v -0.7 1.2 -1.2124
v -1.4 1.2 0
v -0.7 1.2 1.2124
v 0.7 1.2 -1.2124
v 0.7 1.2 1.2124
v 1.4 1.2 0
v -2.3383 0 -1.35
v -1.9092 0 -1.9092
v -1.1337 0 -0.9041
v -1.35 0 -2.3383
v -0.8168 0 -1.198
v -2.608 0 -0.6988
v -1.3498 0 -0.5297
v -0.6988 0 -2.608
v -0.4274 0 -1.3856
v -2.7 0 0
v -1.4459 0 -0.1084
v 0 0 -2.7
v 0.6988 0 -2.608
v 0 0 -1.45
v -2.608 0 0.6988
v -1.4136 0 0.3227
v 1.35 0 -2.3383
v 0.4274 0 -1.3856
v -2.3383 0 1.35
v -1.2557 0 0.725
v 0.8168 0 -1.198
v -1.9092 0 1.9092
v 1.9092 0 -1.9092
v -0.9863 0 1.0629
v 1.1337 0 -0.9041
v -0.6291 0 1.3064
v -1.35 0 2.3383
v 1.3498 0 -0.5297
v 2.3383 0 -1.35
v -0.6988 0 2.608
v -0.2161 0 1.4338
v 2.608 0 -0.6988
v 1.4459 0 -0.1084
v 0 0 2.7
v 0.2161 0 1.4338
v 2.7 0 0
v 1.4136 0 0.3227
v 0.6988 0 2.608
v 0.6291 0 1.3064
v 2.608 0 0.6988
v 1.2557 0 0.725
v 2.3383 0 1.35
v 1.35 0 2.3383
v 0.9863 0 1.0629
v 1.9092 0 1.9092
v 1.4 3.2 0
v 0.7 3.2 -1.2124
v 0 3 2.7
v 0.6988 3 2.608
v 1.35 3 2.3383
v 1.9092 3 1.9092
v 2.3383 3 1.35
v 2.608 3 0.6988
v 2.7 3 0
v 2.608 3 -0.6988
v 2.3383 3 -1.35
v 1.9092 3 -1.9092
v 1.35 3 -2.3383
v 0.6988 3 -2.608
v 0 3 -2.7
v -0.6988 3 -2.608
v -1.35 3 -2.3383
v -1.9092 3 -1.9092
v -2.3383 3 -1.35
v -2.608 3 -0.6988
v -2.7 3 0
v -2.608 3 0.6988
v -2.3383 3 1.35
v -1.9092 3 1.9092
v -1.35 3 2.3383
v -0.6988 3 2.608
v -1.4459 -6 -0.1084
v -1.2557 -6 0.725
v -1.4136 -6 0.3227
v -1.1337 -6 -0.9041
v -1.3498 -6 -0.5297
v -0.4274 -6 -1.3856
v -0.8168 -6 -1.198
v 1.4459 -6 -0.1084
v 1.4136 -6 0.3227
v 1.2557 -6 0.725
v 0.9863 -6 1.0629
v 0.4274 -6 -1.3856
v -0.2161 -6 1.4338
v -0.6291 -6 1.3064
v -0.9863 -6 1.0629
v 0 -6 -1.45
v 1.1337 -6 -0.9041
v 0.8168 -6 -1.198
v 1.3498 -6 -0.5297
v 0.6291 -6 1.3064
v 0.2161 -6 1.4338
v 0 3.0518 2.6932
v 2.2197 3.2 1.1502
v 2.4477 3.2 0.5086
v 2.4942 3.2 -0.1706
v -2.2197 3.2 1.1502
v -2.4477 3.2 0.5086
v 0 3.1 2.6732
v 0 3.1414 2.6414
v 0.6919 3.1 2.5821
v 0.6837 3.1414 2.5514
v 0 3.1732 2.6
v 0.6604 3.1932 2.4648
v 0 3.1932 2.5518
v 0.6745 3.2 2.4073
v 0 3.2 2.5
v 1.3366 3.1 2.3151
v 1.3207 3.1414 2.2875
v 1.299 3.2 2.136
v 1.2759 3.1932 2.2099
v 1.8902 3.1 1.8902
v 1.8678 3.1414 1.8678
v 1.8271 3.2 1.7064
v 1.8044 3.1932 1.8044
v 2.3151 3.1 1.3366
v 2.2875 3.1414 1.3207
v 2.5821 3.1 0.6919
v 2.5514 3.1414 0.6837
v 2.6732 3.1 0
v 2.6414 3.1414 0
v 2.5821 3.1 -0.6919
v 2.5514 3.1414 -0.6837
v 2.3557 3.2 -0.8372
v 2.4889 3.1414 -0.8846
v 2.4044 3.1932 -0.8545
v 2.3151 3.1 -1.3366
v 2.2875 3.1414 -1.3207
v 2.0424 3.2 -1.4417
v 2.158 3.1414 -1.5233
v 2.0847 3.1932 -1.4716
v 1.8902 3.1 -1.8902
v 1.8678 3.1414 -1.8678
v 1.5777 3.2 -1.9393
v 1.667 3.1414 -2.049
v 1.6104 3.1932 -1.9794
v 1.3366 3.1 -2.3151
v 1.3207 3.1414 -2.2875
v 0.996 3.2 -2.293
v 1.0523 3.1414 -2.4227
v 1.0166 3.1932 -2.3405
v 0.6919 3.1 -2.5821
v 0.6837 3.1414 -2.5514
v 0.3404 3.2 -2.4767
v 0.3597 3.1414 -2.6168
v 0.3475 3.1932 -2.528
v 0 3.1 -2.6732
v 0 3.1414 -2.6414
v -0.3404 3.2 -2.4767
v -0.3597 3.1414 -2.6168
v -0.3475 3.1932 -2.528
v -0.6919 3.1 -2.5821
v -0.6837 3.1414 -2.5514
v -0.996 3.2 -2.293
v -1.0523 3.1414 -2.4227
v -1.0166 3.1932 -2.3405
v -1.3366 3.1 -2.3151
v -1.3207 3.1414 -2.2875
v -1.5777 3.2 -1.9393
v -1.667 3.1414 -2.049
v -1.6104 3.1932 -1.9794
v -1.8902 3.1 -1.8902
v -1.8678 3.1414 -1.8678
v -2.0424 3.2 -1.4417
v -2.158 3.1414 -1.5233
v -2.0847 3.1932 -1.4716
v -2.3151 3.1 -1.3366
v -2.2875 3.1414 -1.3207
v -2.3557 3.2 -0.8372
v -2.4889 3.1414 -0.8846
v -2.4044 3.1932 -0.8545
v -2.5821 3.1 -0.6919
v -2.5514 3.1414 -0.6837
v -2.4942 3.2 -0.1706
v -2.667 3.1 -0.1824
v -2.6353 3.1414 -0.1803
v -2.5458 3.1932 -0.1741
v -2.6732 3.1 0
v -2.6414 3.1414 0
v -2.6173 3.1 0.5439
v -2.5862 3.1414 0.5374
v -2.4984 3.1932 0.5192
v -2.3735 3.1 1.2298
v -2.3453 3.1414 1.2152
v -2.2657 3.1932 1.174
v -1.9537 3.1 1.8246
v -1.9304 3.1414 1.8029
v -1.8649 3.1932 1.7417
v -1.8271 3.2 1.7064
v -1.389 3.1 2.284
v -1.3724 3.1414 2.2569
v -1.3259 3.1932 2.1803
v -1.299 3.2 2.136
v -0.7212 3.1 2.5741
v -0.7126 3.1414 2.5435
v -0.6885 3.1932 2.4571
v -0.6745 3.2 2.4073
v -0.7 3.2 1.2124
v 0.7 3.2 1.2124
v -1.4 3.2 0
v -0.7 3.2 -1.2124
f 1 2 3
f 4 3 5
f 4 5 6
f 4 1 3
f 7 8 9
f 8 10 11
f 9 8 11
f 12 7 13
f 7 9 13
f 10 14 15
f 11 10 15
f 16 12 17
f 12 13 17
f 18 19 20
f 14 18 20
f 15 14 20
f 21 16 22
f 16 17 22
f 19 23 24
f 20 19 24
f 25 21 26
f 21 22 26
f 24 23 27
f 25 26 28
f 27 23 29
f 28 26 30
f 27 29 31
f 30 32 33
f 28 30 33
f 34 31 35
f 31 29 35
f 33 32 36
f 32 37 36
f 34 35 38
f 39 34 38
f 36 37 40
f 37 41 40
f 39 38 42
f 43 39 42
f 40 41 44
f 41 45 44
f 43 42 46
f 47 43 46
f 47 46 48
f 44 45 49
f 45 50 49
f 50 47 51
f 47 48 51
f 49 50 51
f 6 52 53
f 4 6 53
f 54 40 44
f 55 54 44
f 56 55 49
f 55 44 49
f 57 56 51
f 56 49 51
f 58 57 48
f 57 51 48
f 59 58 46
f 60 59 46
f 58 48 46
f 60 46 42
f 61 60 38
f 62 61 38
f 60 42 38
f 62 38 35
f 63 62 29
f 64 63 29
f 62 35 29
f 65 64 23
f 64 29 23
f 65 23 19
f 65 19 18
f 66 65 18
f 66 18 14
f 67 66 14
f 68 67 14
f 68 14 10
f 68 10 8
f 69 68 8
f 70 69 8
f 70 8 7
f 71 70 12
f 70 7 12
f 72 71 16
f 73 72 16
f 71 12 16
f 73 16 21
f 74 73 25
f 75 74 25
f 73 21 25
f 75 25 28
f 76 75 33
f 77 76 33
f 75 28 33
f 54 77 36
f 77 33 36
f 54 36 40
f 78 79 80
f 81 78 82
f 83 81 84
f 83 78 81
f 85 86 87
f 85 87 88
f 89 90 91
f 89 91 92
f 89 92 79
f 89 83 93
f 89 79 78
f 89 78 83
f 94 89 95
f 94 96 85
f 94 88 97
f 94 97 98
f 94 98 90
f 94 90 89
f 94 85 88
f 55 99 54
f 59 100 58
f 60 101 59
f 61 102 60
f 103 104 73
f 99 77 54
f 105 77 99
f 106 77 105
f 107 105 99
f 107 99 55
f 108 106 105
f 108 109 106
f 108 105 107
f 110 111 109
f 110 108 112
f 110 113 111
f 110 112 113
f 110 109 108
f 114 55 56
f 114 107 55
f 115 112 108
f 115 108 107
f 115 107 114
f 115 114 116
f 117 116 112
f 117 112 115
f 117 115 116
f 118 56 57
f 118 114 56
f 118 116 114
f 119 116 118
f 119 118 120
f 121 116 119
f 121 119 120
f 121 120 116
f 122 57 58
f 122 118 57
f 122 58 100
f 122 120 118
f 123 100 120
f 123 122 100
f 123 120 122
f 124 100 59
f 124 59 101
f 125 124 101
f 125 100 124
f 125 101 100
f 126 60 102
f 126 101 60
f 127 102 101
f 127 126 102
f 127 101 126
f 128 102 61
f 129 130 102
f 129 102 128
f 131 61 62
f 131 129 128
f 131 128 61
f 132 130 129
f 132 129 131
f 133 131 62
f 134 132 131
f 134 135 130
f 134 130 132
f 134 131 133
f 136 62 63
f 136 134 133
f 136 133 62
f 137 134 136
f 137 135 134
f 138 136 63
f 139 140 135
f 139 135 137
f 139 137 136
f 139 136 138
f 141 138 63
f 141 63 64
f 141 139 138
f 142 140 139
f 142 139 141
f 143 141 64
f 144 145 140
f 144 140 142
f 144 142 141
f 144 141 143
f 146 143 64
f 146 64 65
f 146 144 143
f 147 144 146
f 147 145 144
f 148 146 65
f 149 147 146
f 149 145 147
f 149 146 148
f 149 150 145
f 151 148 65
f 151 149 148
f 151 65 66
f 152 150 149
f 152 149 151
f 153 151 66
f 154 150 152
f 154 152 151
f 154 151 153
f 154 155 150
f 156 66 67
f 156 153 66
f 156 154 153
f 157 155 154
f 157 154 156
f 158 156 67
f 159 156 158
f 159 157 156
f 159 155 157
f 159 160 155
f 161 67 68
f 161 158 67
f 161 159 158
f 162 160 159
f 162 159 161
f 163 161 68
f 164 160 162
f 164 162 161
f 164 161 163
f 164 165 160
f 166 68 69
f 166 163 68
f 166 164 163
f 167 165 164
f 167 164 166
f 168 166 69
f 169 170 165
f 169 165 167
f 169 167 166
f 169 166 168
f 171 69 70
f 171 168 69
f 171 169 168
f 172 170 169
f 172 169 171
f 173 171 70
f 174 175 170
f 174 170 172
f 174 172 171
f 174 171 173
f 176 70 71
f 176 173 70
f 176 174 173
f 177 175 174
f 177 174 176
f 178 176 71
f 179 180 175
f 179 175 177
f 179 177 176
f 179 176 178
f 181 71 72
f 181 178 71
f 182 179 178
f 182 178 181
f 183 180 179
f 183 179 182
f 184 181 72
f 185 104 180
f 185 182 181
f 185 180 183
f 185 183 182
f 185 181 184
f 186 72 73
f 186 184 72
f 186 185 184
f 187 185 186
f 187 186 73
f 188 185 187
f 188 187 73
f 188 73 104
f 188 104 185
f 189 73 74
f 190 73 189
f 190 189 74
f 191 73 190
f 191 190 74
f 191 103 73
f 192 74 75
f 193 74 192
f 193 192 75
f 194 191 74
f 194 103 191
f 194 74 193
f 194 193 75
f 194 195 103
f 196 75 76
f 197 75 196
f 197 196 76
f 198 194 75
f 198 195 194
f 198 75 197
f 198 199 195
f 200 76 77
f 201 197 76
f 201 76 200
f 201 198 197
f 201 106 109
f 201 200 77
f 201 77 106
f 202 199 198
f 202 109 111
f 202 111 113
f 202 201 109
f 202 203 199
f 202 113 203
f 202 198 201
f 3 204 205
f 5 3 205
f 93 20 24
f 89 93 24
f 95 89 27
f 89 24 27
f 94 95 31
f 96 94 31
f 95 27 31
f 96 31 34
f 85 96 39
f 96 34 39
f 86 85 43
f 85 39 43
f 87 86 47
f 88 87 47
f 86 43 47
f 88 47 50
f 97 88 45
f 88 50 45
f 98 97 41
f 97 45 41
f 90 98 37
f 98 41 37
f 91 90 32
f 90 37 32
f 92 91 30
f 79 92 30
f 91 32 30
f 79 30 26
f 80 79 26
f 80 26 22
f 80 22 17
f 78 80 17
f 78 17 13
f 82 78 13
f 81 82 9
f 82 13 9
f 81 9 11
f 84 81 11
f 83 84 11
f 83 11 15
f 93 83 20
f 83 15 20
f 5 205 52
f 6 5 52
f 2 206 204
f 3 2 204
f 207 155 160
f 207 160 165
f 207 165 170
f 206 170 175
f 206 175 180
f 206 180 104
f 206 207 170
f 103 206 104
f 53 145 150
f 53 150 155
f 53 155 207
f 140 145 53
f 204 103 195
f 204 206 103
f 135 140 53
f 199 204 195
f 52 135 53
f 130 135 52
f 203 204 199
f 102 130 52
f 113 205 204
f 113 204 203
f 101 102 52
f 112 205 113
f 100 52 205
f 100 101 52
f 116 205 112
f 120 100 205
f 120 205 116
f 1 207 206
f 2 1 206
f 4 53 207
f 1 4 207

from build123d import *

# Parameters (mm, degrees)
SKETCH1_R           = 2.7
BOSS_EXTRUDE1_DEPTH = 3.2
CUT_EXTRUDE1_DEPTH  = 2
FILLET1_R           = 0.2
SKETCH3_R           = 1.45
BOSS_EXTRUDE3_DEPTH = 6


with BuildPart() as part:
    # Sketch1 → Boss-Extrude1 (new body)
    with BuildSketch(Plane(origin=(0, 0, 0), x_dir=(1, 0, 0), z_dir=(0, 1, 0))):
        with Locations(Location((0, 0, 0), (0, 0, 270))):
            Circle(SKETCH1_R)
    extrude(amount=BOSS_EXTRUDE1_DEPTH)

    # Sketch2 → Cut-Extrude1 (cut)
    with BuildSketch(Plane(origin=(0, 3.2, 0), x_dir=(1, 0, 0), z_dir=(0, 1, 0))):
        Polygon((1.4, 0), (0.7, 1.212435565), (-0.7, 1.212435565), (-1.4, 0), (-0.7, -1.212435565), (0.7, -1.212435565), align=None)
    extrude(amount=-CUT_EXTRUDE1_DEPTH, mode=Mode.SUBTRACT)

    # Fillet1
    fillet1_edges = [part.edges().sort_by_distance(p)[0] for p in [
        (0, 3.2, -2.7),
    ]]
    fillet(fillet1_edges, radius=FILLET1_R)

    # Sketch3 → Boss-Extrude3 (add)
    with BuildSketch(Plane.XZ):
        with Locations(Location((0, 0, 0), (0, 0, 270))):
            Circle(SKETCH3_R)
    extrude(amount=BOSS_EXTRUDE3_DEPTH)


solid = part.part
